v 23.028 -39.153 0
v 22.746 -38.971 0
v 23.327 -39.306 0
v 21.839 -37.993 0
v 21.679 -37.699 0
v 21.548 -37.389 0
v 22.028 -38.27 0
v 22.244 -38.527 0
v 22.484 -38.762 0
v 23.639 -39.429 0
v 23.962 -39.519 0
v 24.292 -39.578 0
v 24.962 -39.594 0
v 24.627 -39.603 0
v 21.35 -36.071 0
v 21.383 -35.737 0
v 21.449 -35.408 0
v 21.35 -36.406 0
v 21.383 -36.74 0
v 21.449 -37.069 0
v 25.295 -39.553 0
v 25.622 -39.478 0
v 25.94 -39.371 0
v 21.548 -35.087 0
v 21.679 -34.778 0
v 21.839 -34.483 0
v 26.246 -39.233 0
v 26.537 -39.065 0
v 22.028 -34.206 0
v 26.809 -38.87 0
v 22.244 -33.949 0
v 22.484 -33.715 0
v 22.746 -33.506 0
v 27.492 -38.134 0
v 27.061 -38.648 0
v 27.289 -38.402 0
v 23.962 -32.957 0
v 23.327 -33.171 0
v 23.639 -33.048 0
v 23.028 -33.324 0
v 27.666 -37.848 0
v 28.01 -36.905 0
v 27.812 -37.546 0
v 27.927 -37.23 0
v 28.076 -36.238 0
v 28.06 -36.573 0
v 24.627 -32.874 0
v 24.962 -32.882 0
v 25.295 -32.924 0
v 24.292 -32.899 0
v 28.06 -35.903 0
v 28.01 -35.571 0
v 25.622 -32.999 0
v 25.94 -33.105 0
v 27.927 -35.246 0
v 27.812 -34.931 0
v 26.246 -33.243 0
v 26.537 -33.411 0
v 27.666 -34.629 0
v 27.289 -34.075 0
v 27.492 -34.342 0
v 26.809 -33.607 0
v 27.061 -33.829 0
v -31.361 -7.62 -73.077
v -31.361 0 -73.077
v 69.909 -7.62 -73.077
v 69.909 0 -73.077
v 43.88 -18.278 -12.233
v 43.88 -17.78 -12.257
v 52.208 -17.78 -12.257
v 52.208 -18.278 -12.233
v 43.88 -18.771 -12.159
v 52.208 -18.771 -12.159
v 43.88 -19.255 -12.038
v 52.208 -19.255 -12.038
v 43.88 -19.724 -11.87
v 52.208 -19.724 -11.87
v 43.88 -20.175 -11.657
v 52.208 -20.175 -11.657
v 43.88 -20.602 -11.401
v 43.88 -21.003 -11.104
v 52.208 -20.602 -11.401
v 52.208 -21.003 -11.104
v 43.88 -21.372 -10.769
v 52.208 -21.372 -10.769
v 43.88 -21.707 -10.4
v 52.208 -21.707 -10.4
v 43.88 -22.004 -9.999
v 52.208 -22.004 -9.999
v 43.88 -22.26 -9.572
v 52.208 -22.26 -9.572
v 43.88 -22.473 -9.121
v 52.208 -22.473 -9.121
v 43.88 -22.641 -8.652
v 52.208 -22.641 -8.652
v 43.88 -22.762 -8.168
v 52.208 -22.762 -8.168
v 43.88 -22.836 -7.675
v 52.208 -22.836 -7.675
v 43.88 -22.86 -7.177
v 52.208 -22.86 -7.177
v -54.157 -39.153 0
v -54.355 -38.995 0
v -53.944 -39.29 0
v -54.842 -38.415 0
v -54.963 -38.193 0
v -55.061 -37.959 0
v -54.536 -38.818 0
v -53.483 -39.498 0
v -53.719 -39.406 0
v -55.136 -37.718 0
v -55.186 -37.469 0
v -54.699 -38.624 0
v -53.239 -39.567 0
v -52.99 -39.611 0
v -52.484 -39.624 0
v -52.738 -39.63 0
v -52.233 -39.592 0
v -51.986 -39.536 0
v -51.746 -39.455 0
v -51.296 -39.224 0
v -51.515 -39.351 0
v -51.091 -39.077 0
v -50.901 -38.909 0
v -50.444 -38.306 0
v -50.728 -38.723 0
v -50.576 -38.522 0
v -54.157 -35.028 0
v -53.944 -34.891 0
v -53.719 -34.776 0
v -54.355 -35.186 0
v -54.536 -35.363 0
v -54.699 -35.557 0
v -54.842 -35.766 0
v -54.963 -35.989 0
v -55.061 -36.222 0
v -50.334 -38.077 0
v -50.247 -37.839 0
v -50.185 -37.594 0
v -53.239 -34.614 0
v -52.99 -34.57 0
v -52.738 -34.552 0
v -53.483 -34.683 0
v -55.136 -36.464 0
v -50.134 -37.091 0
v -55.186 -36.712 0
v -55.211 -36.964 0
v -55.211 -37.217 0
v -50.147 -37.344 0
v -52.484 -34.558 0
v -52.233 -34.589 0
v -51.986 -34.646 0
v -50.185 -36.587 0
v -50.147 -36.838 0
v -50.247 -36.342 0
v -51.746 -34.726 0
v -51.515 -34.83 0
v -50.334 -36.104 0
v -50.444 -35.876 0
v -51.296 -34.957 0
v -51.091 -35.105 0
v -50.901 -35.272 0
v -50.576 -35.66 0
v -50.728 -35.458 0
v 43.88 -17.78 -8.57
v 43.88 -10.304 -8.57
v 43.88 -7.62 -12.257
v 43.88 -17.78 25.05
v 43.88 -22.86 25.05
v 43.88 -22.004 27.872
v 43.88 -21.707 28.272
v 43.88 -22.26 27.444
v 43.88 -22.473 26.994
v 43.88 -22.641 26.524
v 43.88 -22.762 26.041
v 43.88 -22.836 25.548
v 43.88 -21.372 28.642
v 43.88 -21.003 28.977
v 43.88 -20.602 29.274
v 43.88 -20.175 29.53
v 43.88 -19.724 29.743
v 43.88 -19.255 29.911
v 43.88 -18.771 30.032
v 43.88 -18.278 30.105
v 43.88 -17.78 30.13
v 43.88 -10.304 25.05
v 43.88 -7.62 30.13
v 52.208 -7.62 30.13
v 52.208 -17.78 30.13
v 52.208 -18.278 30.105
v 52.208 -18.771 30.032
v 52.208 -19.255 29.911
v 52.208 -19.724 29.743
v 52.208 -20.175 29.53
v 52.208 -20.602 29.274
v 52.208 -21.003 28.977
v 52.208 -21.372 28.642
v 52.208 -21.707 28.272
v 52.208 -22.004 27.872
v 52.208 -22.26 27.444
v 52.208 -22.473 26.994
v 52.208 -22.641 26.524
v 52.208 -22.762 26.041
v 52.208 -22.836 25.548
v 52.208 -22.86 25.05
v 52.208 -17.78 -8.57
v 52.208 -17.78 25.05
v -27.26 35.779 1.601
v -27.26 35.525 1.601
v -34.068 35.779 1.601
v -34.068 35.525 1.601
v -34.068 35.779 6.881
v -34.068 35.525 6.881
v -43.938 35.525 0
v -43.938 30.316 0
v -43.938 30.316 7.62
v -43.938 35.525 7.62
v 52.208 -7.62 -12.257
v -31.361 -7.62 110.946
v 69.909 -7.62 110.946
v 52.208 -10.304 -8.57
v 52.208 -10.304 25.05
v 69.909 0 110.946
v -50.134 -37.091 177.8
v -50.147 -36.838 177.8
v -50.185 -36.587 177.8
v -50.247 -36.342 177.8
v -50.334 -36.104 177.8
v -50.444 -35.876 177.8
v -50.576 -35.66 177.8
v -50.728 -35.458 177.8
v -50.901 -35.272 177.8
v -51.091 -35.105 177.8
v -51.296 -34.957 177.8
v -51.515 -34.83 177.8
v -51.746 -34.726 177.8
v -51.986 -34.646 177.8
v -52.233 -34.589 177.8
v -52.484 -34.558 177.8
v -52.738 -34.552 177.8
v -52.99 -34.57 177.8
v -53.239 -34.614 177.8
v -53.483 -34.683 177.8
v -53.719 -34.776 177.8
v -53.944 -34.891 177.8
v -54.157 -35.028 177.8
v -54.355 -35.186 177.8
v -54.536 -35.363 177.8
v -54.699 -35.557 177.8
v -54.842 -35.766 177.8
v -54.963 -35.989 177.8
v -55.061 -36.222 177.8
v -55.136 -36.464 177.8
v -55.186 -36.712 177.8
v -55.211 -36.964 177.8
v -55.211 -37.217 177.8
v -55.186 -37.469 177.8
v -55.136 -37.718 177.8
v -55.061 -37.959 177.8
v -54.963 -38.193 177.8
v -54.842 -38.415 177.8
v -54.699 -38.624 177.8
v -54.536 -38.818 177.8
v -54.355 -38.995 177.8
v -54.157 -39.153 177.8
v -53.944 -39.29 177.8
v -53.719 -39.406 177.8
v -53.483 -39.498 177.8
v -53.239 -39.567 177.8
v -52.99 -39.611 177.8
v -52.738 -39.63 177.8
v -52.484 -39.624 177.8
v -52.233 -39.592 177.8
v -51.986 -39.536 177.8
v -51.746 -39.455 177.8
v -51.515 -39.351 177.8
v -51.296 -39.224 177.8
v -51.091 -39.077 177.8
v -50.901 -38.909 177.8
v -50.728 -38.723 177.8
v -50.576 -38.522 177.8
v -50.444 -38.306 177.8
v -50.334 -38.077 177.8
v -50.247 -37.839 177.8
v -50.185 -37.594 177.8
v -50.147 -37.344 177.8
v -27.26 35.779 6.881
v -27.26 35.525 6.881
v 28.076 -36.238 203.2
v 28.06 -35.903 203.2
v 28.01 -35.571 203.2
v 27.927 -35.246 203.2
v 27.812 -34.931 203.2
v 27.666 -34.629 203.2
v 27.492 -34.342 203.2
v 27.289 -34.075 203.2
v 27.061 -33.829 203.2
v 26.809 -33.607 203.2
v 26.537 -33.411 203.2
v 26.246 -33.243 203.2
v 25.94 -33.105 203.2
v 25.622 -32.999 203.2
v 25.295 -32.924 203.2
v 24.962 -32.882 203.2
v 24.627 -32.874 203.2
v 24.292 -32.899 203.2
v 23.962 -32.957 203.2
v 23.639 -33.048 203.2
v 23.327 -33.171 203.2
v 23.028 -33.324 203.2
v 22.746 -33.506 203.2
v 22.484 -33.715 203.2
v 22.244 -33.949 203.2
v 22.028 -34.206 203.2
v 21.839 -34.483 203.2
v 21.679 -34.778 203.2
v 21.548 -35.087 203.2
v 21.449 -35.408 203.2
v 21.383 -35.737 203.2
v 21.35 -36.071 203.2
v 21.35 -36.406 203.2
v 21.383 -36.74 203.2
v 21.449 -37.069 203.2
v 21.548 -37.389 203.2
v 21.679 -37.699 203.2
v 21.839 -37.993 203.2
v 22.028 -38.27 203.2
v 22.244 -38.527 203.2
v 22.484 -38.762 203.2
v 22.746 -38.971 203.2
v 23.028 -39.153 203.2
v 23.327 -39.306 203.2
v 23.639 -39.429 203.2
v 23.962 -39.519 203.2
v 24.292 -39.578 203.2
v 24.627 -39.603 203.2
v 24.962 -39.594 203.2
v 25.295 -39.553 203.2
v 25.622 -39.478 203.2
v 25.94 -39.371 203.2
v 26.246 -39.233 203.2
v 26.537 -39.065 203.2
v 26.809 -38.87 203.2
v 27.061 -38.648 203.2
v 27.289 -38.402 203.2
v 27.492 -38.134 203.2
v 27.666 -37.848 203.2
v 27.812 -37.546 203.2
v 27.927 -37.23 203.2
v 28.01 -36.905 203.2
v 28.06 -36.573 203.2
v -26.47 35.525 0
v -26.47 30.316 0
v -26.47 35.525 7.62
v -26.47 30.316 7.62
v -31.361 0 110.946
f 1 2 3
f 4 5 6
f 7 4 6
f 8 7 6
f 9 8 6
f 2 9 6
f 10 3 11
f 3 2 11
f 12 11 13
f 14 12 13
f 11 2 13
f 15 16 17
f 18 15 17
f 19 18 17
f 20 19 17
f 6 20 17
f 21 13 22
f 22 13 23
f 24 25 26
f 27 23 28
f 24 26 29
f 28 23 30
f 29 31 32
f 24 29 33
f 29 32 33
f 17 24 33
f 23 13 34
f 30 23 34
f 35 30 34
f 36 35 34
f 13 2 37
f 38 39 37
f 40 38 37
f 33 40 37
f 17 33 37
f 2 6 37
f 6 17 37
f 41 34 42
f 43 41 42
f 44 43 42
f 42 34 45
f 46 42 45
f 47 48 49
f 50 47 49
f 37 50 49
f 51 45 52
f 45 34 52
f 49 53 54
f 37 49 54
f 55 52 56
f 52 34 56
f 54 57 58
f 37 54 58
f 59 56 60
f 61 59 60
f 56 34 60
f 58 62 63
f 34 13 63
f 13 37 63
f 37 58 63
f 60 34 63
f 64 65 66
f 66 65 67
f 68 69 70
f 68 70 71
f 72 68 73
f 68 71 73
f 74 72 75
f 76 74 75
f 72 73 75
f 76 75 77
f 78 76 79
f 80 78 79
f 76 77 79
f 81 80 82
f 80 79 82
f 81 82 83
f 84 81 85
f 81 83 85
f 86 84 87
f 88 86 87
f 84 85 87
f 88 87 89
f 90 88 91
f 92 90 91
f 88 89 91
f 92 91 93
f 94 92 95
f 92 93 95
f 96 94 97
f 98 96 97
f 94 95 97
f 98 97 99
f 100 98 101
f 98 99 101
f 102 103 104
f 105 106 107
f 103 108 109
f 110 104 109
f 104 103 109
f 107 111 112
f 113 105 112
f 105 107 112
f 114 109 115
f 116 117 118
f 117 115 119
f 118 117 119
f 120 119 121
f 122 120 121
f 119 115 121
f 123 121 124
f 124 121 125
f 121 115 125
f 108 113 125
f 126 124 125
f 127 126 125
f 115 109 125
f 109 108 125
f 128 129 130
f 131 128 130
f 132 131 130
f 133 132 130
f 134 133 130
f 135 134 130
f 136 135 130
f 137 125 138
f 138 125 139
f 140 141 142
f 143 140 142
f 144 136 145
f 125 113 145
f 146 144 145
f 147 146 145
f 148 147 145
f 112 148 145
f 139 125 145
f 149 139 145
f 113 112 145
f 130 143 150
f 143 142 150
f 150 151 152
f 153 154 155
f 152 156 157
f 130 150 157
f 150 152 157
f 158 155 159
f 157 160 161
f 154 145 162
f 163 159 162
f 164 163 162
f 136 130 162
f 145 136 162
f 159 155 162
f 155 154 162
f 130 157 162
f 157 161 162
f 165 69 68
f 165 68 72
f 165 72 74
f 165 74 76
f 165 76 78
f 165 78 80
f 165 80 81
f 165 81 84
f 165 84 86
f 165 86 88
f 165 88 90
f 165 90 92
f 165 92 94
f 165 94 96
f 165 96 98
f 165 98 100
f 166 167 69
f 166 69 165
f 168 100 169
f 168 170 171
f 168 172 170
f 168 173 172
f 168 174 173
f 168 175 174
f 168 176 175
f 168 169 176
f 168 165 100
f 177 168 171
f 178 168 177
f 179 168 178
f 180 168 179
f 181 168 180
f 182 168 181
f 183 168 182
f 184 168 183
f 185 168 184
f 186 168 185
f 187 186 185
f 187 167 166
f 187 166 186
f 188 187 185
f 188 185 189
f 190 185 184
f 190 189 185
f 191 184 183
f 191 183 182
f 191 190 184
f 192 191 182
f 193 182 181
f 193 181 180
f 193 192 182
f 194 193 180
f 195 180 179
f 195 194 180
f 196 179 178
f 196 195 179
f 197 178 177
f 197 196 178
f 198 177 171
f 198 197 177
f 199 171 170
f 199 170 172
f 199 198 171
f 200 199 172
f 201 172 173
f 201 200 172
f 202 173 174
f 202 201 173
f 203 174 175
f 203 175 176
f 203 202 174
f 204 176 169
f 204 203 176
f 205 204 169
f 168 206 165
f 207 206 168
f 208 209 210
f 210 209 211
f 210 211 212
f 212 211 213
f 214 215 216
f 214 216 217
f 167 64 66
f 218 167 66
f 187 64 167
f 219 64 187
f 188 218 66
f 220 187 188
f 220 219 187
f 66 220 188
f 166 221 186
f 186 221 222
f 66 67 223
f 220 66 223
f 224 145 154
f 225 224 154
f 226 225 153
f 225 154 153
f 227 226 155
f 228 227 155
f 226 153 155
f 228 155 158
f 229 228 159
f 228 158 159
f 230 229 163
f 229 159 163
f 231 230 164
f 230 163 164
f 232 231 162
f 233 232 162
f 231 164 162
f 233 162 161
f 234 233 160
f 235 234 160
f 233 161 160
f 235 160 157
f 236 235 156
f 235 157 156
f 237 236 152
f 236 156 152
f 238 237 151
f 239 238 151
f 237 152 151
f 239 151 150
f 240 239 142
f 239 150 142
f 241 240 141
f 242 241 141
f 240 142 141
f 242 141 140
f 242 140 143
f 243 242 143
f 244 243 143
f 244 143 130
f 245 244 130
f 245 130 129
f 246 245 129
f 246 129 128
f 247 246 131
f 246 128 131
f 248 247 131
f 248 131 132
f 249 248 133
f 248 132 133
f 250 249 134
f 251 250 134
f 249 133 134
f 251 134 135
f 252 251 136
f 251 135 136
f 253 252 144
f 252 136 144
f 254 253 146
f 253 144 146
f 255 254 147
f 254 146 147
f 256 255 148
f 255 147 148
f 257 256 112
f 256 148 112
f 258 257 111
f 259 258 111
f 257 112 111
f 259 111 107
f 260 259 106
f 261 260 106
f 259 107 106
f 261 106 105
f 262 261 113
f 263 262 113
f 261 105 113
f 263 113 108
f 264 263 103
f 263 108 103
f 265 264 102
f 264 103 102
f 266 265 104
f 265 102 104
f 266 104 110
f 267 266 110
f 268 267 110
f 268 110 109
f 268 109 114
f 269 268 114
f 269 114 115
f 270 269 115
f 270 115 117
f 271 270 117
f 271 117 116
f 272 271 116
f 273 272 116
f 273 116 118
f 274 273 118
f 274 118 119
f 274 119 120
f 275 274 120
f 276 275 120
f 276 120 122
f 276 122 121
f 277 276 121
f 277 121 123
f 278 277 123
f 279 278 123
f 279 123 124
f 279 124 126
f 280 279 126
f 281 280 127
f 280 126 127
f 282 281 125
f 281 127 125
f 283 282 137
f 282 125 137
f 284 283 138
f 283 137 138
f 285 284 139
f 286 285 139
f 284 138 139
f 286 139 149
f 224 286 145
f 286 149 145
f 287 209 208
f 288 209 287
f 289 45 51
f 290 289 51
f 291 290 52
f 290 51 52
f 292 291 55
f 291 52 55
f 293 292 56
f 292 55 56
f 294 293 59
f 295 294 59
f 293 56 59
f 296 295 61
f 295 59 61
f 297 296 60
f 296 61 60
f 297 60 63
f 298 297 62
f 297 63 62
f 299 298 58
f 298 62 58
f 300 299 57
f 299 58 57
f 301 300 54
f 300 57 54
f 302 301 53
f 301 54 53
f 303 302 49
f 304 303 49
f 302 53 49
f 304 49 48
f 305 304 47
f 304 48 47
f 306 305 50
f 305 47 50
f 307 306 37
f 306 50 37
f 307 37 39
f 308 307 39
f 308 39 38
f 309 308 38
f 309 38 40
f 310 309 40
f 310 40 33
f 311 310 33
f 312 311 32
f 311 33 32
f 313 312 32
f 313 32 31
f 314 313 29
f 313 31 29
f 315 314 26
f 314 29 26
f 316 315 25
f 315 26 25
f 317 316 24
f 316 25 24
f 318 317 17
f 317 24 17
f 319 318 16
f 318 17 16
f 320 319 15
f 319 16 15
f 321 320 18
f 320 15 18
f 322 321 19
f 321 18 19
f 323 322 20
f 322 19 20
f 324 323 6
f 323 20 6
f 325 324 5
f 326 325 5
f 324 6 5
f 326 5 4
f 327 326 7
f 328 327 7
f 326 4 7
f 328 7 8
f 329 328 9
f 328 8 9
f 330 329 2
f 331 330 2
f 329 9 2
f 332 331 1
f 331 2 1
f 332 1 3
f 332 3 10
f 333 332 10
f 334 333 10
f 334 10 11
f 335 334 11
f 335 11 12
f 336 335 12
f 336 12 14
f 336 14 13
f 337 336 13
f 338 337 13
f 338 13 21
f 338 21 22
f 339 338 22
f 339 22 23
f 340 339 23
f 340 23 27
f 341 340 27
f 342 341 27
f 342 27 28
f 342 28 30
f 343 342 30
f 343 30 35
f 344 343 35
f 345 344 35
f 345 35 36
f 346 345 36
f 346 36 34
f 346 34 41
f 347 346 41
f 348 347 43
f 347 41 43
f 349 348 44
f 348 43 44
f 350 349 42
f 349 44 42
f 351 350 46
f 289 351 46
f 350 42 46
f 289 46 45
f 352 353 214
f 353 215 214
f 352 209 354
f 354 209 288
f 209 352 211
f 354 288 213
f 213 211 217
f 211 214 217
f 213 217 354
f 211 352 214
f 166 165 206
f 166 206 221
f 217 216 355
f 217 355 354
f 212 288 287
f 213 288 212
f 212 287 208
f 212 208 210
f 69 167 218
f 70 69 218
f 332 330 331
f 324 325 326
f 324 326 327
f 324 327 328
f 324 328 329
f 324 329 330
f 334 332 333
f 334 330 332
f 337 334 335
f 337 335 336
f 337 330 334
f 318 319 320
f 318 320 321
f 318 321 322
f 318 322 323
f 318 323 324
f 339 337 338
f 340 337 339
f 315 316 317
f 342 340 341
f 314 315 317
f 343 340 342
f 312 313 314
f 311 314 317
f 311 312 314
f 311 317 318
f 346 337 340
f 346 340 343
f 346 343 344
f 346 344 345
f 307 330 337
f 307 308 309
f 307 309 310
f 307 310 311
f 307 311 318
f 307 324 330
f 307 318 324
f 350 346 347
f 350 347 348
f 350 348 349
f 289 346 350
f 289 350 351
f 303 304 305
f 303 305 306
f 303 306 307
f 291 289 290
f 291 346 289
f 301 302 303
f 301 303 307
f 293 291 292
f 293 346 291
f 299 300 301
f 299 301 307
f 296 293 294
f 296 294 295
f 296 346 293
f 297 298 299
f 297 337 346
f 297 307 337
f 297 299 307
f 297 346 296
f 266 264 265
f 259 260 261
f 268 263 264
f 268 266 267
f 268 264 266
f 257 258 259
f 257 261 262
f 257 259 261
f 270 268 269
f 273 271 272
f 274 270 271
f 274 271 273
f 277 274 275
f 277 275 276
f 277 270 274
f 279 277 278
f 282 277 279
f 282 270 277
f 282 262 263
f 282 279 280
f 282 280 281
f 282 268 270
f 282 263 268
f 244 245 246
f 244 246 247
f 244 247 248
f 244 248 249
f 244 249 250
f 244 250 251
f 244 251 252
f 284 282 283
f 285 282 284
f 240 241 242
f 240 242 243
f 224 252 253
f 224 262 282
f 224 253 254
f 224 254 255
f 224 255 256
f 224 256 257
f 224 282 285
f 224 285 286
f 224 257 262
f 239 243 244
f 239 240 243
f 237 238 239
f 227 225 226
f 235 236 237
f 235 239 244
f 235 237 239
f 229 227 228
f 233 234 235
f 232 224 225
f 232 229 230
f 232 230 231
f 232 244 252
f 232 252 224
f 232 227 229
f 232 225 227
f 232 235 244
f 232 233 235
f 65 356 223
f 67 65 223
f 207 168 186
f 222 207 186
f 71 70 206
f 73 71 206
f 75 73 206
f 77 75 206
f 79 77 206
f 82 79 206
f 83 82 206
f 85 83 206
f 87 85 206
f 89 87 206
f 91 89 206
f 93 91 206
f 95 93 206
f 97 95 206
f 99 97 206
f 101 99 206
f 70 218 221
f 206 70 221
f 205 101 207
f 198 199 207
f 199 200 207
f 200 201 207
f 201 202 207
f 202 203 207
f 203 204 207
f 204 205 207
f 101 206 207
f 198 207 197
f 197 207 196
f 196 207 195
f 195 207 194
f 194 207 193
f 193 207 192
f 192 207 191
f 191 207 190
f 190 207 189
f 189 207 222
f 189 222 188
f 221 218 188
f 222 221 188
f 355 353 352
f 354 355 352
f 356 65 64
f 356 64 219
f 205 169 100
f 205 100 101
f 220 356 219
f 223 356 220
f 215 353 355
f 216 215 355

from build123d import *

# Parameters (mm, degrees)
F0_W      = 12.3879984021
F0_H      = 5.2089989185
F1_DEPTH  = 7.62
F2_DEPTH  = 5.08
F3_W      = 6.8076755852
F3_H      = 5.2791479975
F4_DEPTH  = 0.254
F5_R      = 2.54
F6_DEPTH  = 177.8
F7_R      = 3.3655
F8_DEPTH  = 203.2
F9_W      = 101.2698
F9_H      = 184.023
F10_DEPTH = 7.62
F11_W     = 8.3280205727
F11_H     = 42.3867786303
F12_DEPTH = 15.24
F13_R     = 5.08
F14_W     = 7.4755899894
F14_H     = 33.6194024739
F15_DEPTH = 10.16


with BuildPart() as f1:
    # F0 (on Top) → F1 (new body)
    with BuildSketch(Plane.XY):
        with Locations((-37.7440974116, 32.9208746552)):
            Rectangle(F0_W, F0_H)
    extrude(amount=F1_DEPTH)

    # F2 (add): a face of the model
    f2_faces = [f1.faces().sort_by_distance(p)[0] for p in [
        (-31.5500982106, 32.9208746552, 3.81),
    ]]
    extrude(f2_faces, amount=F2_DEPTH)

    # F3 (on face) → F4 (join)
    with BuildSketch(Plane(origin=(0, 35.5253741145, 0), x_dir=(-1, 0, 0), z_dir=(0, 1, 0))):
        with Locations((30.6641729549, 4.2410148308)):
            Rectangle(F3_W, F3_H)
    extrude(amount=F4_DEPTH)


with BuildPart() as f6:
    # F5 (on Top) → F6 (new body)
    with BuildSketch(Plane.XY):
        with Locations((-52.6742525399, -37.0907485485)):
            Circle(F5_R)
    extrude(amount=F6_DEPTH)


with BuildPart() as f8:
    # F7 (on Top) → F8 (new body)
    with BuildSketch(Plane.XY):
        with Locations((24.7108265758, -36.2383015454)):
            Circle(F7_R)
    extrude(amount=F8_DEPTH)


with BuildPart() as f10:
    # F9 (on Front) → F10 (new body)
    with BuildSketch(Plane.XZ):
        with Locations((19.2736731842, 18.9346689013)):
            Rectangle(F9_W, F9_H)
    extrude(amount=F10_DEPTH)

    # F11 (on face) → F12 (join)
    with BuildSketch(Plane.XZ.offset(7.62)):
        with Locations((48.0439439416, 8.9363283478)):
            Rectangle(F11_W, F11_H)
    extrude(amount=F12_DEPTH)

    # F13
    f13_edges = [f10.edges().sort_by_distance(p)[0] for p in [
        (48.043944, -22.86, 30.129718),
        (48.043944, -22.86, -12.257061),
    ]]
    fillet(f13_edges, radius=F13_R)

    # F14 (on face) → F15 (cut)
    with BuildSketch(Plane.YZ.offset(52.2079542279)):
        with Locations((-14.0422050053, 8.240016426)):
            Rectangle(F14_W, F14_H)
    extrude(amount=-F15_DEPTH, mode=Mode.SUBTRACT)


solid = Compound([f1.part, f6.part, f8.part, f10.part])
